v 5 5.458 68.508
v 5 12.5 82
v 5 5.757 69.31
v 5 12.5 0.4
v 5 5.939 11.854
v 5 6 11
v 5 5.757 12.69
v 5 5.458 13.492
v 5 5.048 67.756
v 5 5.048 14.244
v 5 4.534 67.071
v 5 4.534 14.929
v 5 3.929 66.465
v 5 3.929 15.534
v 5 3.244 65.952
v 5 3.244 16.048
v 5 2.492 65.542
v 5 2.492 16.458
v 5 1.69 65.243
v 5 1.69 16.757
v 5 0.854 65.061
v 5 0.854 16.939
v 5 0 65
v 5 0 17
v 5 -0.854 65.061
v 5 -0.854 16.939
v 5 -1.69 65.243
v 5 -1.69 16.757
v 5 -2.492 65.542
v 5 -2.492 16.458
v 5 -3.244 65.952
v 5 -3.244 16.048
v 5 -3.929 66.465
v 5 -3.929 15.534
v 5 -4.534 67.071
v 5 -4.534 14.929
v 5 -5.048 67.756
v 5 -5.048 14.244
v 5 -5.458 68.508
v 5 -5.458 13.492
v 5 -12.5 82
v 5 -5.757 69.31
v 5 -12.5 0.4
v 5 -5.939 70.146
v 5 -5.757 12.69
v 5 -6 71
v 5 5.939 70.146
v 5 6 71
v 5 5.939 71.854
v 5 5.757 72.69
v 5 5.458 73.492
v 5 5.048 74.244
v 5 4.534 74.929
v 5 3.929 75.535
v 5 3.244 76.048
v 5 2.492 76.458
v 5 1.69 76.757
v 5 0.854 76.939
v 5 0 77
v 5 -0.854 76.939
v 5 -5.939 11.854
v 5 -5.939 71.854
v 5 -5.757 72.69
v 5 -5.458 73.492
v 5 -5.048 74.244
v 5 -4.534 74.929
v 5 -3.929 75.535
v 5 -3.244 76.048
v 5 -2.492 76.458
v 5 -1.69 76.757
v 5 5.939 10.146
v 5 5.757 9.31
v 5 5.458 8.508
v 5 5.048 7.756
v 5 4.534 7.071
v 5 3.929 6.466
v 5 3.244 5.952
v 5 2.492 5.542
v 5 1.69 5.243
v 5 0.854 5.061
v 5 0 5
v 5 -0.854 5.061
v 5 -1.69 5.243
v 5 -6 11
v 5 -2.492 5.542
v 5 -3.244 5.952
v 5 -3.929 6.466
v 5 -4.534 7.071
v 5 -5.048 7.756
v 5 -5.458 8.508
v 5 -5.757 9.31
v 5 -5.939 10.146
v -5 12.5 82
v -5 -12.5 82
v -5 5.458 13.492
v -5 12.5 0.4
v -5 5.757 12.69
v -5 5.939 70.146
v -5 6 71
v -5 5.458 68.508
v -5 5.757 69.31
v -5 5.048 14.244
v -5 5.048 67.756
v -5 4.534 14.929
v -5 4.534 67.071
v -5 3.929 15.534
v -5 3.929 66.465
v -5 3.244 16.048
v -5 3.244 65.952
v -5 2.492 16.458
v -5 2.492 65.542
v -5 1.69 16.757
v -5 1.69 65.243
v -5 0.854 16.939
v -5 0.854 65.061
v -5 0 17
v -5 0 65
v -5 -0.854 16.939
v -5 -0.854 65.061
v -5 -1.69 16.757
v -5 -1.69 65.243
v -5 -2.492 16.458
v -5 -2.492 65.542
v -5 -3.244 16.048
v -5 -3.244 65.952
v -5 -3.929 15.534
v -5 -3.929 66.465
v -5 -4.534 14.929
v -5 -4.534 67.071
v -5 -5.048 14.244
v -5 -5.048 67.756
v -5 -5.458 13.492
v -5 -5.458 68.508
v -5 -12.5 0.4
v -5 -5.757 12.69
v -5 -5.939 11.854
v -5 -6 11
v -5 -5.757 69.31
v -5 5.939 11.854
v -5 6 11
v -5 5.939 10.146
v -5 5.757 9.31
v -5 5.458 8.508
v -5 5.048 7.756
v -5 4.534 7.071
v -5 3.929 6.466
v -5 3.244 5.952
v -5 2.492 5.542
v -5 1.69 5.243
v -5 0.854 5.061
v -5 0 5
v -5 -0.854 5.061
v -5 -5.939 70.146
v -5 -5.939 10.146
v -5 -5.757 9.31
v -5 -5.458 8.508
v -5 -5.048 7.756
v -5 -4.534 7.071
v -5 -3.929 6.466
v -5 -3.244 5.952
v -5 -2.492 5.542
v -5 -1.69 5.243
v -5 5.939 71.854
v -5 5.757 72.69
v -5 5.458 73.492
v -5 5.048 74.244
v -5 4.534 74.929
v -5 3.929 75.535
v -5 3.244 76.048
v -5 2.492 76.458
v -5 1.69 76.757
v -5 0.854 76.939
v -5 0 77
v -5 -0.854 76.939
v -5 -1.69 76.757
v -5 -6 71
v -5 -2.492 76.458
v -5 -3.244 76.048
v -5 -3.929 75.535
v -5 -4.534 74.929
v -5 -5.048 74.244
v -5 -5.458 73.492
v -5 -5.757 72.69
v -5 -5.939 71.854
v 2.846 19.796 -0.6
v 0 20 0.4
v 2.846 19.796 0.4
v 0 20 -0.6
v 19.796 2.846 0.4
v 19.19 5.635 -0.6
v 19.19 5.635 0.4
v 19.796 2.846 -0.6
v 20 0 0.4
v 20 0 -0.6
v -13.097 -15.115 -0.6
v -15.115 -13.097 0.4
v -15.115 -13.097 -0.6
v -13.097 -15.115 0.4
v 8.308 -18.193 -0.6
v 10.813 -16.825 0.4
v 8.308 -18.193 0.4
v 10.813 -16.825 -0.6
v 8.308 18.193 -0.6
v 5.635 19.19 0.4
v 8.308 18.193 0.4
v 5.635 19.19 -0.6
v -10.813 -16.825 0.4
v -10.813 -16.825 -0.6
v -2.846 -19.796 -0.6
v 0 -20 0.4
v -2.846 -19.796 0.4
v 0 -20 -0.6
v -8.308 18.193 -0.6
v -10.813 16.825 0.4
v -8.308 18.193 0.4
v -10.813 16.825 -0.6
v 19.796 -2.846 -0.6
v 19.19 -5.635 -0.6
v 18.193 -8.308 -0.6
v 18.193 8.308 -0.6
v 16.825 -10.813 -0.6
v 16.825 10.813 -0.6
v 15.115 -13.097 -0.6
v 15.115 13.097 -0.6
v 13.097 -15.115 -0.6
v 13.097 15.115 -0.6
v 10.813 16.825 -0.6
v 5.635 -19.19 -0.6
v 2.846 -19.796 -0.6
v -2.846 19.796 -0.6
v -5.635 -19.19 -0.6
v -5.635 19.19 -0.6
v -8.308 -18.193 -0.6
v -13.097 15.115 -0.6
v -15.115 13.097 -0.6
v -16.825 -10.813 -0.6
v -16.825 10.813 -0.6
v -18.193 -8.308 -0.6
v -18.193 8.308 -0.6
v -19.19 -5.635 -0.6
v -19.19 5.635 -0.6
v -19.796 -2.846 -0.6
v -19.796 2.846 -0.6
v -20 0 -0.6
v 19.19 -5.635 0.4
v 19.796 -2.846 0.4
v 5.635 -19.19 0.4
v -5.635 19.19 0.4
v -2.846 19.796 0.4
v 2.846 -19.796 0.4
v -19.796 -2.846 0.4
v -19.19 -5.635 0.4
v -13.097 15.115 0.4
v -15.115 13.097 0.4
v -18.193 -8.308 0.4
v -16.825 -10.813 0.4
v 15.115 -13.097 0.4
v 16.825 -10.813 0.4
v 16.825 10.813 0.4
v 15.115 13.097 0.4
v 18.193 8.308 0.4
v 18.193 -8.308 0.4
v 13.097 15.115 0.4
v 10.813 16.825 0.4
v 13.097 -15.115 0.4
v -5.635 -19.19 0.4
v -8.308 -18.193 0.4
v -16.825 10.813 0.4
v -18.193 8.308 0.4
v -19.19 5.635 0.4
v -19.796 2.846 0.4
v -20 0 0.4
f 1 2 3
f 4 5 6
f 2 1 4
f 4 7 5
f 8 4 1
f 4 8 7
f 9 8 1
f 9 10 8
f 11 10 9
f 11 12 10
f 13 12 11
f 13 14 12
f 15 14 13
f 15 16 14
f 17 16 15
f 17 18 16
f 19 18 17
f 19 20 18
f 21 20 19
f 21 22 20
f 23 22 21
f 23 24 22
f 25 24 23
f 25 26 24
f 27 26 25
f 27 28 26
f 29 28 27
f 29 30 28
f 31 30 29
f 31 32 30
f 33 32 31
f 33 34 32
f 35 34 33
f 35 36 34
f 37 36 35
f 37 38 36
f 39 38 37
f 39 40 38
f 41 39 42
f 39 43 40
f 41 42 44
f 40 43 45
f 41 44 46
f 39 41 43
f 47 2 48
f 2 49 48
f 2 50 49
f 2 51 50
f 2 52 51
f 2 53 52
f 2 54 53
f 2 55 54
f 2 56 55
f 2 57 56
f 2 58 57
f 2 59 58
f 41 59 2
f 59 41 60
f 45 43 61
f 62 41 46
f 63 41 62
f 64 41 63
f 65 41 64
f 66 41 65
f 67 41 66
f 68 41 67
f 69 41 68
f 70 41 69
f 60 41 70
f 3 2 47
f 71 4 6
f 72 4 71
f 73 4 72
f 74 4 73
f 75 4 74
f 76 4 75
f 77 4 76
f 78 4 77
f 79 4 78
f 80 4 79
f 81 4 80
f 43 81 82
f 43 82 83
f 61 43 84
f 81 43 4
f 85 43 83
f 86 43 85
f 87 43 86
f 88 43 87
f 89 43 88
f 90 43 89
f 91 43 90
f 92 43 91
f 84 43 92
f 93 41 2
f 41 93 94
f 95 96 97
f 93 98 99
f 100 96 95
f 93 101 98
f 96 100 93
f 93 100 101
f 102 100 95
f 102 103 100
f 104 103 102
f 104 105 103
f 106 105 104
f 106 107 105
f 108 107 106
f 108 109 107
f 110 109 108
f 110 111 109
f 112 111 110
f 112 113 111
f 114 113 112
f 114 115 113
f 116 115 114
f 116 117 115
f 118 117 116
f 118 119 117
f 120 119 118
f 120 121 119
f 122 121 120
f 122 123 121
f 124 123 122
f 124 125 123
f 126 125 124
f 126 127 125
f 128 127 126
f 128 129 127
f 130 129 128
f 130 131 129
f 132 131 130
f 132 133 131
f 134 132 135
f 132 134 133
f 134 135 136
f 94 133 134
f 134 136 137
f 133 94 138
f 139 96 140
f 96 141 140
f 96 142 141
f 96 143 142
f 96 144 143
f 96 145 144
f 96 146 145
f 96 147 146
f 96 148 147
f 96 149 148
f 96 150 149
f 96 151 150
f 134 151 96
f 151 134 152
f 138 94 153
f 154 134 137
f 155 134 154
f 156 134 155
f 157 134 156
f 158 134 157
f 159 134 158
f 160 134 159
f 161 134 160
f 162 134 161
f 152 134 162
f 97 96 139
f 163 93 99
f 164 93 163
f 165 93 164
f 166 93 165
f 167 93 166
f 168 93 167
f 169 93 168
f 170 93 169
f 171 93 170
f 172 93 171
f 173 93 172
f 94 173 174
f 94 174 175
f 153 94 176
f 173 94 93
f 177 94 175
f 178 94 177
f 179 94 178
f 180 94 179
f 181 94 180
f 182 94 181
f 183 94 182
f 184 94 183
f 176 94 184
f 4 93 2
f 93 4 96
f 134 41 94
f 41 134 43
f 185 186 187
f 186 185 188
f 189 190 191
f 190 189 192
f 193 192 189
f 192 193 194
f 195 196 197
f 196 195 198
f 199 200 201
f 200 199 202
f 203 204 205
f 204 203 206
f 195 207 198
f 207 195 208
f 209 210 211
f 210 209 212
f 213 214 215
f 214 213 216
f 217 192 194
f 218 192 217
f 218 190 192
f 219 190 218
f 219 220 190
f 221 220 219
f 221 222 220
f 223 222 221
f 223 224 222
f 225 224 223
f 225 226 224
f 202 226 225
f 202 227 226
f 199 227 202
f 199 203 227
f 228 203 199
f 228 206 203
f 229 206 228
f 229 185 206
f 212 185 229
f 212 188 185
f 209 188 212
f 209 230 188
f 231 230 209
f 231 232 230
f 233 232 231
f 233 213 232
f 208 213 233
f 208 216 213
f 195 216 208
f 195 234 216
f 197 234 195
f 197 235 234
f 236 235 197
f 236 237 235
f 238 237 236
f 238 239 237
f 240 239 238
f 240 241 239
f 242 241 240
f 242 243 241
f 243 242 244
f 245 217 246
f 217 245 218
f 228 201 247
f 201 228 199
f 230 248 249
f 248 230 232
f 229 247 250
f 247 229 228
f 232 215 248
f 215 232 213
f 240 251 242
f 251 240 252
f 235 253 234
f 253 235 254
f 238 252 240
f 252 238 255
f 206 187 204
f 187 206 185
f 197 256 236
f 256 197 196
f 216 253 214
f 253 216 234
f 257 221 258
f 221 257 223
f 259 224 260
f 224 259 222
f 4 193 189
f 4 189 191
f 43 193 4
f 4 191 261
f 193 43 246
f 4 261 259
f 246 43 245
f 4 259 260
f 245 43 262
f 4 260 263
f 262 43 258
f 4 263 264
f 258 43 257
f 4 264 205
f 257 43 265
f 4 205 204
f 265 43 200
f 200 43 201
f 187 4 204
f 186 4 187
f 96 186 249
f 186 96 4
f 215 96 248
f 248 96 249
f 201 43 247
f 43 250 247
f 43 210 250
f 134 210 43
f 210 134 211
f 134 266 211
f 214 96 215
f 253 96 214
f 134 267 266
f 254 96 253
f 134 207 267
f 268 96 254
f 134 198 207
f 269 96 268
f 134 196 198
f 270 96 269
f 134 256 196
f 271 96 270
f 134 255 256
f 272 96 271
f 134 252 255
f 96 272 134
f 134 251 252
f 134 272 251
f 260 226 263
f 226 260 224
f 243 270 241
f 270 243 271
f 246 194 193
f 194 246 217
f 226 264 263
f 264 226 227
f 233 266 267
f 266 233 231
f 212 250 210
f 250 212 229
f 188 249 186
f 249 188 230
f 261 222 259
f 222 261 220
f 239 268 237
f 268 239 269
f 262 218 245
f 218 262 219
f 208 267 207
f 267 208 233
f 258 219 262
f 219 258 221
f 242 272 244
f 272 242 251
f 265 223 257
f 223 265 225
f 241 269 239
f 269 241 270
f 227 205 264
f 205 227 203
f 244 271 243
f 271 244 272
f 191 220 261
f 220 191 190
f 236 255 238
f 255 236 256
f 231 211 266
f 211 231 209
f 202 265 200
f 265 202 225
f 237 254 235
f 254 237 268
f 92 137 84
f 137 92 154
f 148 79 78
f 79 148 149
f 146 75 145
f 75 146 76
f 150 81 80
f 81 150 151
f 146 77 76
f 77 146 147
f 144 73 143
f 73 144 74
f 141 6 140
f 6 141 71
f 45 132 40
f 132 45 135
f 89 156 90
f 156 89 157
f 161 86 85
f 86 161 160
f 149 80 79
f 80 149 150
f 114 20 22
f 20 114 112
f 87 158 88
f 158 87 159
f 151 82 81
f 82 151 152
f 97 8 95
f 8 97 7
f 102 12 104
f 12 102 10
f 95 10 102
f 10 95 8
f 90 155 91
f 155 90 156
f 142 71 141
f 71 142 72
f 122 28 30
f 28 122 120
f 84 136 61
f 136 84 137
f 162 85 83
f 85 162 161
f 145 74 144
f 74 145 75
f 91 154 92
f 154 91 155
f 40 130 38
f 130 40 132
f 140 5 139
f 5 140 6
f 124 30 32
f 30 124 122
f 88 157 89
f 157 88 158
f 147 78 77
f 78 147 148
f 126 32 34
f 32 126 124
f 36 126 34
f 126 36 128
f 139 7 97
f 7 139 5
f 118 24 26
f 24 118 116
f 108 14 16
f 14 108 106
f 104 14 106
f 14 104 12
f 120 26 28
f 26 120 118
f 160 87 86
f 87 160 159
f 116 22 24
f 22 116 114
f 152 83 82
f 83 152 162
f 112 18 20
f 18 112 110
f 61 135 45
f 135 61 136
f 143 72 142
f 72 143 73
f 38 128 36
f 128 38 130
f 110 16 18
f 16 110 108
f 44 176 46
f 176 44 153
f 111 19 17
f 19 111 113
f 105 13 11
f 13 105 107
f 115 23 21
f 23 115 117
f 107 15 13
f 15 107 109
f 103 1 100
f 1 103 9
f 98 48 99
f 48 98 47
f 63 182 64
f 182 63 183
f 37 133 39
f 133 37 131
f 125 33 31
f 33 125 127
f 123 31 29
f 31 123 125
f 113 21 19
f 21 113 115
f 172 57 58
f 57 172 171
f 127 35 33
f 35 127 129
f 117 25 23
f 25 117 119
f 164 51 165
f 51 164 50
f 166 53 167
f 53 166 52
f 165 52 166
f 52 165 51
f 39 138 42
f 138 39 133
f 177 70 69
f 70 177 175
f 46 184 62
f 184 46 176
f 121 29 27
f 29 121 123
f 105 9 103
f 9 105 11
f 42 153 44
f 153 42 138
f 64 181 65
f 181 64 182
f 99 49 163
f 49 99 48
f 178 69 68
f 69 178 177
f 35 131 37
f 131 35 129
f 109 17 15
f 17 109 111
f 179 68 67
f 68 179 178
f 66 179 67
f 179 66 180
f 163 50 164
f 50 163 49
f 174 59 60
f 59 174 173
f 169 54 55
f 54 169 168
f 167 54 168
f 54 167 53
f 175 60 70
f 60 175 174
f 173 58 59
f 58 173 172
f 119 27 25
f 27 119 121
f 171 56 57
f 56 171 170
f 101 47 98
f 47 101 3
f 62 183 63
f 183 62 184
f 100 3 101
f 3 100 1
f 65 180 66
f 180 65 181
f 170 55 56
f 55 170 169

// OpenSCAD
//simple Z relative calibration tool by yru

//bar spacing
bs=60;
//bar radius
br=12/2;
//base radius
baser=20;
//tool width
tw=25;
//tool depth
td=10;
//tool margin
tm=5;


difference(){
union(){
translate([-td/2,-tw/2,0]) cube([10,tw,tm*2+bs+br*2]);
translate([0,0,-.1]) rotate([0,0,0]) cylinder(center=true,r=baser,h=1,$fn=44);
}
translate([0,0,tm+br]) rotate([0,90,0]) cylinder(center=true,r=br,h=td+130,$fn=44);
translate([0,0,tm+bs+br]) rotate([0,90,0]) cylinder(center=true,r=br,h=td+130,$fn=44);
}
